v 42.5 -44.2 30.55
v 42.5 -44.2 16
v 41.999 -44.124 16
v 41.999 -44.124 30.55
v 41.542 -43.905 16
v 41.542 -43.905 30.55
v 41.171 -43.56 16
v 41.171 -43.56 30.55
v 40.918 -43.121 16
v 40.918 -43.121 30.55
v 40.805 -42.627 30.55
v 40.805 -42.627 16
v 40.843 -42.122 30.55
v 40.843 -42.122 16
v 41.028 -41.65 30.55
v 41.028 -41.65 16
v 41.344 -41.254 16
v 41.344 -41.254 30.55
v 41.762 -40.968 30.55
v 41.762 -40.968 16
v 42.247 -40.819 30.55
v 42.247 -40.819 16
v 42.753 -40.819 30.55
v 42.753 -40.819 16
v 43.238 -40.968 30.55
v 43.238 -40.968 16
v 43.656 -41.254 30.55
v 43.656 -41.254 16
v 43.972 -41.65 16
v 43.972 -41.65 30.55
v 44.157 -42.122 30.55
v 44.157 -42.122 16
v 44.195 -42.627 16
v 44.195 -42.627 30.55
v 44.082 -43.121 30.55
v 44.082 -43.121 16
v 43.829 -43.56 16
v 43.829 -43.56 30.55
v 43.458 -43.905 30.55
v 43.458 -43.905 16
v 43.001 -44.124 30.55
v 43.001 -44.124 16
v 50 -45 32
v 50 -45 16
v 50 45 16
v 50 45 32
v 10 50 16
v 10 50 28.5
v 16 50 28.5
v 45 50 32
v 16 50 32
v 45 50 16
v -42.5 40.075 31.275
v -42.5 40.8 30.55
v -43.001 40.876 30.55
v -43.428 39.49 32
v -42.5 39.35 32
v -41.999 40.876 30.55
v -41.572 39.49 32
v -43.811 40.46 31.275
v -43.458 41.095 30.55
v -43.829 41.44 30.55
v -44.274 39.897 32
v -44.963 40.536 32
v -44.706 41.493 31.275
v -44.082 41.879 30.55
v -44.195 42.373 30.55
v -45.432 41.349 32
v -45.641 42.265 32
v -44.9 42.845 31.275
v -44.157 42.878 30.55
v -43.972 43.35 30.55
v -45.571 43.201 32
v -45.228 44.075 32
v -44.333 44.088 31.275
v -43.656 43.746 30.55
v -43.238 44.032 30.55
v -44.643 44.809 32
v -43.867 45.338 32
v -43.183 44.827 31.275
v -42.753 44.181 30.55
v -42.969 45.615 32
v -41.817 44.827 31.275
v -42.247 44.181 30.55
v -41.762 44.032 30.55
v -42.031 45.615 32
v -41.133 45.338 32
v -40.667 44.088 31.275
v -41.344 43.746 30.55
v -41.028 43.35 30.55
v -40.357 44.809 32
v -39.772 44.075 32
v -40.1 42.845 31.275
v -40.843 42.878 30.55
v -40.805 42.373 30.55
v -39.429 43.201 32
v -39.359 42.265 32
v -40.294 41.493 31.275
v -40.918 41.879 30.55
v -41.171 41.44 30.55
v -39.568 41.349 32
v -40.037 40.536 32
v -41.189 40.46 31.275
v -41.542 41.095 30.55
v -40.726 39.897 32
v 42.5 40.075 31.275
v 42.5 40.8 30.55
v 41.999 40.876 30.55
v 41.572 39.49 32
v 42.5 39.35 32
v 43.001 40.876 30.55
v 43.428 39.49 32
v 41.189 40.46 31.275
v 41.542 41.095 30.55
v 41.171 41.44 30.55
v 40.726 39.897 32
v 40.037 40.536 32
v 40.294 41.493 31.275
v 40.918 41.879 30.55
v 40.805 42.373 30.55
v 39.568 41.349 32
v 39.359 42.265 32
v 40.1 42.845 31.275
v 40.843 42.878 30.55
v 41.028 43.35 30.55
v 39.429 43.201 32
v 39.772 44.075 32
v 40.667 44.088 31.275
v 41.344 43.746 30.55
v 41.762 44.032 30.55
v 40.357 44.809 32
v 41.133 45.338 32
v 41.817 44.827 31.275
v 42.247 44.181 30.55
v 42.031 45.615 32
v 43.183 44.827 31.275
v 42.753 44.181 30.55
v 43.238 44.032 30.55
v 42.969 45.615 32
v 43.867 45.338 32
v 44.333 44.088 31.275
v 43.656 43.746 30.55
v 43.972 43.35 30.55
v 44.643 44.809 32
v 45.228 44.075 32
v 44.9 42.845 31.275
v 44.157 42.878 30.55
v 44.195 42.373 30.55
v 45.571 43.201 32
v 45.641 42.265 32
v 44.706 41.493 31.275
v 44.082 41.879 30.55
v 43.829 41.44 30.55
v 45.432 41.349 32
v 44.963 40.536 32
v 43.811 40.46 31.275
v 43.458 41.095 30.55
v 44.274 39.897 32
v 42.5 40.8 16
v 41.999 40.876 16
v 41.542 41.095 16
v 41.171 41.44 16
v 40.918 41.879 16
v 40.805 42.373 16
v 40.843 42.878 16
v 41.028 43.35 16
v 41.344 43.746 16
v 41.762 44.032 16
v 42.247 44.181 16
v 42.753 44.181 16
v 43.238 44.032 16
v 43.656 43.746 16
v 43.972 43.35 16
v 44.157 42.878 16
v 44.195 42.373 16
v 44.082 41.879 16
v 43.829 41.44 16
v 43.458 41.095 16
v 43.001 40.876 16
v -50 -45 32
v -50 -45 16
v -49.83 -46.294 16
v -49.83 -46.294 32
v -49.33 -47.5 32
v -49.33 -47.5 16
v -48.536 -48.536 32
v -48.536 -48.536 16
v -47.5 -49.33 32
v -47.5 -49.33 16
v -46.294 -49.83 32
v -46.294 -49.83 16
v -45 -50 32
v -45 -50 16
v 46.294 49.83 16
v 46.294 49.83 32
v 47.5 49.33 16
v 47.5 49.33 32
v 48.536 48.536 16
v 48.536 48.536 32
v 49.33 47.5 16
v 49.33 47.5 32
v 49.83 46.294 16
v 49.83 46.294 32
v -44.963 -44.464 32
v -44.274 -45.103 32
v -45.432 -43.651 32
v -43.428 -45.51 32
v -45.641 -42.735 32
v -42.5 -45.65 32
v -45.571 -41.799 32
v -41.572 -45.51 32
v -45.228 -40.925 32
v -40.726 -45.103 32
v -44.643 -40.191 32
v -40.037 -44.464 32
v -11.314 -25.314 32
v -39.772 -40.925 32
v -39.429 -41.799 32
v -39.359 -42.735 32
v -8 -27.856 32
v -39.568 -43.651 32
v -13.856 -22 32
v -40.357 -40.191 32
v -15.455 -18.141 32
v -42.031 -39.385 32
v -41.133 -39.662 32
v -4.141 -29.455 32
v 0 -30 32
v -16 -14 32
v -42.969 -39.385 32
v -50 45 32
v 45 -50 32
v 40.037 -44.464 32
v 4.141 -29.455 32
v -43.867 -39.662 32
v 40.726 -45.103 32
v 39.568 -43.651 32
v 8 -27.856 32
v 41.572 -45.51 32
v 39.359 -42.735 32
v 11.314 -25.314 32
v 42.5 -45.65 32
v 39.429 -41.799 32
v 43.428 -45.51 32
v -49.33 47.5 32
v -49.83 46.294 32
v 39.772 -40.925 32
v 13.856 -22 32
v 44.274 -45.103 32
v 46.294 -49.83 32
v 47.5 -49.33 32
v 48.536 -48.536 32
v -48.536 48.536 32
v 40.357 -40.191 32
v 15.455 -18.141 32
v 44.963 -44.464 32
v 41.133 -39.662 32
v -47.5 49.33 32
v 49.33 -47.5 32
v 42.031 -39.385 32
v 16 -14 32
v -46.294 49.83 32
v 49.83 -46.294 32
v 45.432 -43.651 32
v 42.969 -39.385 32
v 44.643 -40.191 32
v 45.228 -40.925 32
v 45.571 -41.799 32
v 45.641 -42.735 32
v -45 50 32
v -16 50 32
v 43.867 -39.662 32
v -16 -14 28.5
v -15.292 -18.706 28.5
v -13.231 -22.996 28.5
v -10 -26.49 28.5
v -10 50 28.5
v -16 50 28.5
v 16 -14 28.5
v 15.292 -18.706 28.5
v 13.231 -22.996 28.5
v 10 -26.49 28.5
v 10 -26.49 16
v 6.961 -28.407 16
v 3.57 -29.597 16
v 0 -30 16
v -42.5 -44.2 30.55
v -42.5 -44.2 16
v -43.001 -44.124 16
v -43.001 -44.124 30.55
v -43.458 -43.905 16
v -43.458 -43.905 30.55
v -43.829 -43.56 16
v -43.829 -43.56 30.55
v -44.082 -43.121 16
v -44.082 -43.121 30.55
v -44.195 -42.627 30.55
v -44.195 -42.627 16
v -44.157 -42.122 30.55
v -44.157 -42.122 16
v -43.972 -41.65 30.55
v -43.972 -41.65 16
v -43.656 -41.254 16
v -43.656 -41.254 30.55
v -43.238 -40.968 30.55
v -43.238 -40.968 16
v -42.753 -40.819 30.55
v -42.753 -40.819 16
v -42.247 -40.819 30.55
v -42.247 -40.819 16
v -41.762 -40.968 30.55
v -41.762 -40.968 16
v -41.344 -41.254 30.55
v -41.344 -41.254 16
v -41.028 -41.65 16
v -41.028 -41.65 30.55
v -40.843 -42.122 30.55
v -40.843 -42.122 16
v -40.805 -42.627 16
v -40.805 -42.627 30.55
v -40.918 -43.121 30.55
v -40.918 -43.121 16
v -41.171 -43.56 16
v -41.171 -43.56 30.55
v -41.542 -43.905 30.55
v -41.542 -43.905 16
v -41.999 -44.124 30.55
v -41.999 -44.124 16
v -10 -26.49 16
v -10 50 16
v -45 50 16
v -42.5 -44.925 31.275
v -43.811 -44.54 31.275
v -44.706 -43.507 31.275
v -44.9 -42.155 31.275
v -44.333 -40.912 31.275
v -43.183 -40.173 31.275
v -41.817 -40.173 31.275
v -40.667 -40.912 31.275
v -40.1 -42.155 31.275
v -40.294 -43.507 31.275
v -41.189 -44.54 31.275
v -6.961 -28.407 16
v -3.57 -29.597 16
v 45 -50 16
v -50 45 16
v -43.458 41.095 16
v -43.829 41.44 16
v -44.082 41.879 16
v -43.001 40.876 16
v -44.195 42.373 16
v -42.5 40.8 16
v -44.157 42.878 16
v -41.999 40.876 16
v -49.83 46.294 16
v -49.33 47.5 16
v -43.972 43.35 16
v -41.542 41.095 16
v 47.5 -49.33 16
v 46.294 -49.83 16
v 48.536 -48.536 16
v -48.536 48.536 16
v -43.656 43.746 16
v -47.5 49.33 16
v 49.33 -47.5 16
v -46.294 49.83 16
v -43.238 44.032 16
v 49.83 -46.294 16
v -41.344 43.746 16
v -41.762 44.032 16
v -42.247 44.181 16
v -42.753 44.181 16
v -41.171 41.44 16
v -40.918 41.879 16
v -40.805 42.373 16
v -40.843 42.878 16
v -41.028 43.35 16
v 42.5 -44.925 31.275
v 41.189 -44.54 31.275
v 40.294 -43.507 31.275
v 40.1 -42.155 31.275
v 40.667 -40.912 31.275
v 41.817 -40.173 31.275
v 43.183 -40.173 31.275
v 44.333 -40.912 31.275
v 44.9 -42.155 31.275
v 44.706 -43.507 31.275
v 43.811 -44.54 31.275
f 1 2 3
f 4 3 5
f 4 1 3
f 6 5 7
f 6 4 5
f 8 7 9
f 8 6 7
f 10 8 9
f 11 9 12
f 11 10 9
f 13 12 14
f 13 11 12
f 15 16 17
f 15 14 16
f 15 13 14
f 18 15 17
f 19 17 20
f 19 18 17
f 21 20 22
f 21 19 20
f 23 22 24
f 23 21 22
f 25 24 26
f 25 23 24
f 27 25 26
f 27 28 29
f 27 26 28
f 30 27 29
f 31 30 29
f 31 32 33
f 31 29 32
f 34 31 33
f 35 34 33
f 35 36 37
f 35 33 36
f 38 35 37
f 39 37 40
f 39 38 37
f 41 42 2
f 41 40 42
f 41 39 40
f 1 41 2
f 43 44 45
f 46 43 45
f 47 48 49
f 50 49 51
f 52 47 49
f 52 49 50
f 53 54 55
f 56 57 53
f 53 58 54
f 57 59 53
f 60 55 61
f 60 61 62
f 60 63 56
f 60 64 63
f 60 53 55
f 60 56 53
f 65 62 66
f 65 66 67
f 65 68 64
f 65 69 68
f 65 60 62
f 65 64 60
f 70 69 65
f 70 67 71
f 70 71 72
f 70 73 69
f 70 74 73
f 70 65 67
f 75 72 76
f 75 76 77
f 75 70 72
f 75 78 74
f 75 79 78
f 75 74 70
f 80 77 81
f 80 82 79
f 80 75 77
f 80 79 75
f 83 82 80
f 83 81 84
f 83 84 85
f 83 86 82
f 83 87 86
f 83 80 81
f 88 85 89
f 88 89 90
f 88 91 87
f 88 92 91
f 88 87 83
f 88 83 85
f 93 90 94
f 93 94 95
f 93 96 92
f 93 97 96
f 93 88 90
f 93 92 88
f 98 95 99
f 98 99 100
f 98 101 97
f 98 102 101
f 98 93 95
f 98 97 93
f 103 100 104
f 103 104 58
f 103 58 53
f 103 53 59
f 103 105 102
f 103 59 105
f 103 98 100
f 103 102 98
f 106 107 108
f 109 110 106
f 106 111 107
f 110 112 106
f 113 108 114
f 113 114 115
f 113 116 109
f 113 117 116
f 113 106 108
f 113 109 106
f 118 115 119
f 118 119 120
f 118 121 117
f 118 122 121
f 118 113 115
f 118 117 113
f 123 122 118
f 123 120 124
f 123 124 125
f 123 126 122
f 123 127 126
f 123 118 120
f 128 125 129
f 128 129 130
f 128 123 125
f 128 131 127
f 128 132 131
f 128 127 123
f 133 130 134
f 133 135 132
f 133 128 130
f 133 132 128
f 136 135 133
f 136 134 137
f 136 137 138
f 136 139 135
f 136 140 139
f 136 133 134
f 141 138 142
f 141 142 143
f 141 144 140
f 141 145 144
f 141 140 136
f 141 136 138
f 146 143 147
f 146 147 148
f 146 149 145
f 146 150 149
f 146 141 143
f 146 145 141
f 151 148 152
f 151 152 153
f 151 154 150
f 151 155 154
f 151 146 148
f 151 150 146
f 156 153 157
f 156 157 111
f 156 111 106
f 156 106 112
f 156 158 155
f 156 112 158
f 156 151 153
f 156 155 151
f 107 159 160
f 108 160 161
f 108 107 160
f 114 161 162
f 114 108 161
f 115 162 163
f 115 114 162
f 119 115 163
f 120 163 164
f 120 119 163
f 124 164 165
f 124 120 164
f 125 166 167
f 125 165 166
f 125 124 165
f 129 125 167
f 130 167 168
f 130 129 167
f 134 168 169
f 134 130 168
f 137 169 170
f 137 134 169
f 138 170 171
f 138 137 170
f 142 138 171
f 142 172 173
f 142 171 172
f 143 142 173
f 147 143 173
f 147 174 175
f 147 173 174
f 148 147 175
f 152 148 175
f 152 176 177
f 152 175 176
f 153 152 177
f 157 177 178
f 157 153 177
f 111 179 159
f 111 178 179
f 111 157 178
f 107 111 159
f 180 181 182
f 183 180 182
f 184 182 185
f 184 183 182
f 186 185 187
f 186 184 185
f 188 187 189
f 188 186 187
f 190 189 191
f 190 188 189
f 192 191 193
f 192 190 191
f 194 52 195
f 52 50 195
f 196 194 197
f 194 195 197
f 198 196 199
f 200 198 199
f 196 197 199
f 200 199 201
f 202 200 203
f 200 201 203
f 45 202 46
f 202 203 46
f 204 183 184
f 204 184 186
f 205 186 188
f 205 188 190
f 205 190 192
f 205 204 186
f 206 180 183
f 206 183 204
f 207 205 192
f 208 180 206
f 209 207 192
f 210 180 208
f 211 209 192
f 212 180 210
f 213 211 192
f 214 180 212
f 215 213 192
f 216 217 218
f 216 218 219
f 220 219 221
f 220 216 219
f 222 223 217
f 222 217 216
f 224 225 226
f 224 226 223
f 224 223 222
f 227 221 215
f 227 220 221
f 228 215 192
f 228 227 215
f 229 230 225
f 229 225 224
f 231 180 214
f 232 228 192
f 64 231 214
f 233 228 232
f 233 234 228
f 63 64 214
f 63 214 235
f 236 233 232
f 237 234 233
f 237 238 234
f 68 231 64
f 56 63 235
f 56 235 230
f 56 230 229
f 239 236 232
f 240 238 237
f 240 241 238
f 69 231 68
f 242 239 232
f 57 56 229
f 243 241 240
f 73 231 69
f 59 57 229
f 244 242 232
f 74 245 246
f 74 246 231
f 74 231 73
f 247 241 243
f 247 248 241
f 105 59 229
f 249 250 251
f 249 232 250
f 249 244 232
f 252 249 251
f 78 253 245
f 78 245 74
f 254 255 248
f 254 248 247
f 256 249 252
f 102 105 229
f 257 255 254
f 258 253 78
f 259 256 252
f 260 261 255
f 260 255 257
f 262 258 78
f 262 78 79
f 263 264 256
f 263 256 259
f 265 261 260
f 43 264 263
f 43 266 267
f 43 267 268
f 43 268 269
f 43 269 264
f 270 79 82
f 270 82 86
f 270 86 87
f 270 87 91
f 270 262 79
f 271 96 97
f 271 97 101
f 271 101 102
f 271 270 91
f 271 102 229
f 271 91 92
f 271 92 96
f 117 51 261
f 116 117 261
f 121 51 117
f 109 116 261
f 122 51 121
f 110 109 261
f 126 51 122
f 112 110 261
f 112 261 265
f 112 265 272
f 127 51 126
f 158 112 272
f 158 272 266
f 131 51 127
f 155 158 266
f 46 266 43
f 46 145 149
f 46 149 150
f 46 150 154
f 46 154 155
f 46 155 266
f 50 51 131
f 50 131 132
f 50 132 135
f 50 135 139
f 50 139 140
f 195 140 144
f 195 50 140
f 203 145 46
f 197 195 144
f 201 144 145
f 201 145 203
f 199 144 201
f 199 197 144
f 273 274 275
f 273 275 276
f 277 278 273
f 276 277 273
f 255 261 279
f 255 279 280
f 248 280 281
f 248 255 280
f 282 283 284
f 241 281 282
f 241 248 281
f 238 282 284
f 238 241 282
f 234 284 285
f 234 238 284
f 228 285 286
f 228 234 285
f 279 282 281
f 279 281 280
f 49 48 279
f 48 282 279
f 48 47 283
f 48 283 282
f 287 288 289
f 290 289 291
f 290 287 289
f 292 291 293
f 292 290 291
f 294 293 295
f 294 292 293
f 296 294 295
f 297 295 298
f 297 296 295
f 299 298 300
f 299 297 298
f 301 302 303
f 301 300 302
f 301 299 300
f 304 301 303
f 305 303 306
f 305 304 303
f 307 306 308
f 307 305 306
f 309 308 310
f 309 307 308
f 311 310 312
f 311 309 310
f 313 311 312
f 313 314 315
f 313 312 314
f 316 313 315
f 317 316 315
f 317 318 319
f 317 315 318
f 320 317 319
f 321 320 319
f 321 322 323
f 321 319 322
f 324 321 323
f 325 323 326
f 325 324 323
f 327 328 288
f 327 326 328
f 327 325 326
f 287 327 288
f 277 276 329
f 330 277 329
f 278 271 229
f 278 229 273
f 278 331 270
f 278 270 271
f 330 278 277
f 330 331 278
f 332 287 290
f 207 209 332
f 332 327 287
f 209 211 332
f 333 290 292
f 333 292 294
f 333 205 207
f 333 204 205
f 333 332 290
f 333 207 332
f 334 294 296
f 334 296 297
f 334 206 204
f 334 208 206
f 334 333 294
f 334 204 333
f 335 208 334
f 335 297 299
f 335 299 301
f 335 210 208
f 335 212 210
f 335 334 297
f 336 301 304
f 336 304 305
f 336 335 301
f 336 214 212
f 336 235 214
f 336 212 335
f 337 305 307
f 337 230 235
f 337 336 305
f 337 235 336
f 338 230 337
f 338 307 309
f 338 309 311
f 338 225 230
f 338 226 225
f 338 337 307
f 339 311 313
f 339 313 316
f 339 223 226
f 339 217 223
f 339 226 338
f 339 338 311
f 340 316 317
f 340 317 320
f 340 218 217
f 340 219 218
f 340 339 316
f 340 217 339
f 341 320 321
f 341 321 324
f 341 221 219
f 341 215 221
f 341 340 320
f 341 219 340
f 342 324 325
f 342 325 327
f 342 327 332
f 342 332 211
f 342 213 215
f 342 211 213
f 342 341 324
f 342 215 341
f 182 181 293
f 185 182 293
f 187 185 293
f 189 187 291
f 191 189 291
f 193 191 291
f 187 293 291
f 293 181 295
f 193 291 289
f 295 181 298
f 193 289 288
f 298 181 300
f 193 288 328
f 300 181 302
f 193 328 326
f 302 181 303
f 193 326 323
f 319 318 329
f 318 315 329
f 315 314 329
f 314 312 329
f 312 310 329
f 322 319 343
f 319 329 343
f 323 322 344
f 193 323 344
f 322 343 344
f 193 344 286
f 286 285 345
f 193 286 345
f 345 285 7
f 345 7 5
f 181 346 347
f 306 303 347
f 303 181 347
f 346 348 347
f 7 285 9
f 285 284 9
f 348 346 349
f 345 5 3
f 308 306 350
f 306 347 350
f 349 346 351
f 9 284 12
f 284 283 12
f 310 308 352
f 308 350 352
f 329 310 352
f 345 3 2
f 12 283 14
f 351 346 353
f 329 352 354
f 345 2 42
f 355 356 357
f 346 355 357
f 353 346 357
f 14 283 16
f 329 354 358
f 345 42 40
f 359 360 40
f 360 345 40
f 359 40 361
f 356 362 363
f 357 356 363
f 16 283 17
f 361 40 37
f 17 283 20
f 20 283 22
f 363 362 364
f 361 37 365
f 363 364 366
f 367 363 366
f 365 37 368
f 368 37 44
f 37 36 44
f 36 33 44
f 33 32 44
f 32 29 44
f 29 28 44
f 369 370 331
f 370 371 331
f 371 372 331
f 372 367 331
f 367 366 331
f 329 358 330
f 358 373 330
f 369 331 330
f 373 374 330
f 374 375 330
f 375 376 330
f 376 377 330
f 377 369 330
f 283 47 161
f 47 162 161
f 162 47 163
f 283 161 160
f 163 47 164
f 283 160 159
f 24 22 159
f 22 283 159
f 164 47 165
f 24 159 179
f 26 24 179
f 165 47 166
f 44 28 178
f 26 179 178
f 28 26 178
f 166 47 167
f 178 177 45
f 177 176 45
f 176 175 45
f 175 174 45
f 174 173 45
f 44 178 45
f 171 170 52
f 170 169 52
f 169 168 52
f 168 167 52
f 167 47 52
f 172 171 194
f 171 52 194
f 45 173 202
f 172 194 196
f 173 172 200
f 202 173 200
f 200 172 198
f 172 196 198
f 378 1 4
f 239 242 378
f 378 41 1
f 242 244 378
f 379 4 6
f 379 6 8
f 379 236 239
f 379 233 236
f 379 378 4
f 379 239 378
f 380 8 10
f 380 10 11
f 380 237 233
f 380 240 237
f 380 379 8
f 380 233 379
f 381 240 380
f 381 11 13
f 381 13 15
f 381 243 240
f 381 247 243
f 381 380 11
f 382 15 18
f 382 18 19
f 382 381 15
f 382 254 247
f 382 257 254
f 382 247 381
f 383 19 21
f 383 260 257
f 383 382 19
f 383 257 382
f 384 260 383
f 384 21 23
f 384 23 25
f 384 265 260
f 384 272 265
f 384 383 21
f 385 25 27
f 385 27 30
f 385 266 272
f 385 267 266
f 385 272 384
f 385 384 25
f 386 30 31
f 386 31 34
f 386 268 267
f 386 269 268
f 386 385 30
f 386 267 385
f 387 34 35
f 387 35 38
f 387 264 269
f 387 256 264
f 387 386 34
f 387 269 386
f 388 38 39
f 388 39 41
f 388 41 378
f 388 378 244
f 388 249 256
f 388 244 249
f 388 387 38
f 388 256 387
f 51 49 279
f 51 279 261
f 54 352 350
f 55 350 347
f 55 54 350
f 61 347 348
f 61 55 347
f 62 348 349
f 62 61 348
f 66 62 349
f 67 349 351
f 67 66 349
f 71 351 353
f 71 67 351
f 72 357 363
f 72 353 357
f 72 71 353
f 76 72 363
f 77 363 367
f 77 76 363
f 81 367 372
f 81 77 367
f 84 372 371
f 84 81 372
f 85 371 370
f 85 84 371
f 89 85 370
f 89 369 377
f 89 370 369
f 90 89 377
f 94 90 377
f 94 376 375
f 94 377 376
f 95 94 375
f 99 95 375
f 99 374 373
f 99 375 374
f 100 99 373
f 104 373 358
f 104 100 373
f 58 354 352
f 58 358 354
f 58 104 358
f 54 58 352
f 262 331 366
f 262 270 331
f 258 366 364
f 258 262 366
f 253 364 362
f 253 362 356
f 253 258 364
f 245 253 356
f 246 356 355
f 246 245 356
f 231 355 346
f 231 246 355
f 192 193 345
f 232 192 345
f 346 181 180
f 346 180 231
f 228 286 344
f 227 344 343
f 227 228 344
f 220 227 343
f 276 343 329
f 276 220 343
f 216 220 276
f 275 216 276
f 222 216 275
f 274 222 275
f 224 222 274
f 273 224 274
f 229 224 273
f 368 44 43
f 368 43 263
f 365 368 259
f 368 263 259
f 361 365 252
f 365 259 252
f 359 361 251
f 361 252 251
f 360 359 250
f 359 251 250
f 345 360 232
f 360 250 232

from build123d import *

# Parameters (mm, degrees)
SKETCH1_W                                    = 100
SKETCH1_H                                    = 100
BOSS_EXTRUDE1_DEPTH                          = 16
SKETCH2_W                                    = 100
SKETCH2_H                                    = 100
BOSS_EXTRUDE2_DEPTH                          = 16
CUT_EXTRUDE1_DEPTH                           = 80
BOSS_EXTRUDE3_DEPTH                          = 16
BOSS_EXTRUDE4_REACH                          = 75.763
CSK_FOR_M3_COUNTERSUNK_FLAT_HEAD_SCR_2_COUNT = 2
CSK_FOR_M3_COUNTERSUNK_FLAT_HEAD_SCR_2_PITCH = 85
CSK_FOR_M3_COUNTERSUNK_FLAT_HEAD_SCR_3_COUNT = 2
CSK_FOR_M3_COUNTERSUNK_FLAT_HEAD_SCR_3_PITCH = 120.208152802
CSK_FOR_M3_COUNTERSUNK_FLAT_HEAD_SCR_4_COUNT = 2
CSK_FOR_M3_COUNTERSUNK_FLAT_HEAD_SCR_4_PITCH = 85
FILLET1_R                                    = 5
FILLET2_R                                    = 5


with BuildPart() as part:
    # Sketch1 → Boss-Extrude1 (new body)
    with BuildSketch(Plane.XY):
        Rectangle(SKETCH1_W, SKETCH1_H)
    extrude(amount=BOSS_EXTRUDE1_DEPTH)


with BuildPart() as body_2:
    # Sketch2 → Boss-Extrude2 (new body)
    with BuildSketch(Plane.XY.offset(16)):
        Rectangle(SKETCH2_W, SKETCH2_H)
    extrude(amount=BOSS_EXTRUDE2_DEPTH)


with BuildPart() as cut_extrude1_tool:
    # Sketch3 → Cut-Extrude1 (new body)
    with BuildSketch(Plane(origin=(0, 50, 0), x_dir=(1, 0, 0), z_dir=(0, 1, 0))):
        Polygon((-16, -32), (-16, -28.5), (-10, -28.5), (-10, -16), (-16, -16), (-16, -11), (16, -11), (16, -16), (10, -16), (10, -28.5), (16, -28.5), (16, -32), align=None)
    extrude(amount=-CUT_EXTRUDE1_DEPTH)


with BuildPart() as part_1:
    add(part.part)

    # Cut-Extrude1: cut by cut_extrude1_tool
    add(cut_extrude1_tool.part, mode=Mode.SUBTRACT)



with BuildPart() as body_2_1:
    add(body_2.part)

    # Cut-Extrude1: cut by cut_extrude1_tool
    add(cut_extrude1_tool.part, mode=Mode.SUBTRACT)

    # Sketch4 → Boss-Extrude3 (add)
    with BuildSketch(Plane.XY.offset(32)):
        with BuildLine():
            Line((-16, -14), (-16, -30))
            Line((-16, -30), (0, -30))
            ThreePointArc((0, -30), (-11.313708499, -25.313708499), (-16, -14))
        make_face()
        with BuildLine():
            ThreePointArc((16, -14), (11.313708499, -25.313708499), (0, -30))
            Line((0, -30), (16, -30))
            Line((16, -30), (16, -14))
        make_face()
    extrude(amount=-BOSS_EXTRUDE3_DEPTH)


with BuildPart() as part_2:
    add(part_1.part)

    # Sketch5 → Boss-Extrude4 (add, up to next)
    with BuildSketch(Plane.XY.offset(11), mode=Mode.PRIVATE) as boss_extrude4_sk1:
        with BuildLine():
            Line((16, -30), (16, -14))
            ThreePointArc((16, -14), (11.313708487, -25.313708511), (-3.4e-08, -30))
            Line((-3.4e-08, -30), (16, -30))
        make_face()
    boss_extrude4_tool1 = extrude(boss_extrude4_sk1.sketch, amount=BOSS_EXTRUDE4_REACH, mode=Mode.PRIVATE) - body_2_1.part
    # Sketch5 → Boss-Extrude4 (add, up to next)
    with BuildSketch(Plane.XY.offset(11), mode=Mode.PRIVATE) as boss_extrude4_sk2:
        with BuildLine():
            ThreePointArc((-3.4e-08, -30), (-11.313708511, -25.313708487), (-16, -14))
            Line((-16, -14), (-16, -30))
            Line((-16, -30), (-3.4e-08, -30))
        make_face()
    boss_extrude4_tool2 = extrude(boss_extrude4_sk2.sketch, amount=BOSS_EXTRUDE4_REACH, mode=Mode.PRIVATE) - body_2_1.part
    add(boss_extrude4_tool1.solids().sort_by_distance((12.426113, -26.426113, 11))[0])
    add(boss_extrude4_tool2.solids().sort_by_distance((-12.426113, -26.426113, 11))[0])


with BuildPart() as csk_for_m3_countersunk_flat_head_screw1_tool:
    # Sketch7 → CSK for M3 Countersunk Flat Head Screw1 (revolve)
    with BuildSketch(Plane(origin=(-42.5, 42.5, 32), x_dir=(0, -1, 0), z_dir=(1, 0, 0))):
        Polygon((0, 0), (0, 32), (1.7, 32), (1.7, 1.45), (3.15, 0), align=None)
    csk_for_m3_countersunk_flat_head_screw1 = revolve(axis=Axis((-42.5, 42.5, 38.35), (0, 0, -1)))


with BuildPart() as part_3:
    add(part_2.part)

    # CSK for M3 Countersunk Flat Head Screw1: cut by csk_for_m3_countersunk_flat_head_screw1_tool
    add(csk_for_m3_countersunk_flat_head_screw1_tool.part, mode=Mode.SUBTRACT)


with BuildPart() as body_2_2:
    add(body_2_1.part)

    # CSK for M3 Countersunk Flat Head Screw1: cut by csk_for_m3_countersunk_flat_head_screw1_tool
    add(csk_for_m3_countersunk_flat_head_screw1_tool.part, mode=Mode.SUBTRACT)


with BuildPart() as csk_for_m3_countersunk_flat_head_scr_2_tool:
    # CSK for M3 Countersunk Flat Head Scr 2: CSK for M3 Countersunk Flat Head Screw1 ×2
    with Locations(*[(i * CSK_FOR_M3_COUNTERSUNK_FLAT_HEAD_SCR_2_PITCH, 0, 0) for i in range(1, CSK_FOR_M3_COUNTERSUNK_FLAT_HEAD_SCR_2_COUNT)]):
        add(csk_for_m3_countersunk_flat_head_screw1)


with BuildPart() as part_4:
    add(part_3.part)

    # CSK for M3 Countersunk Flat Head Scr 2: cut by csk_for_m3_countersunk_flat_head_scr_2_tool
    add(csk_for_m3_countersunk_flat_head_scr_2_tool.part, mode=Mode.SUBTRACT)


with BuildPart() as body_2_3:
    add(body_2_2.part)

    # CSK for M3 Countersunk Flat Head Scr 2: cut by csk_for_m3_countersunk_flat_head_scr_2_tool
    add(csk_for_m3_countersunk_flat_head_scr_2_tool.part, mode=Mode.SUBTRACT)


with BuildPart() as csk_for_m3_countersunk_flat_head_scr_3_tool:
    # CSK for M3 Countersunk Flat Head Scr 3: CSK for M3 Countersunk Flat Head Screw1 ×2
    with Locations(*[Vector(0.7071067811865476, -0.7071067811865476, 0) * (i * CSK_FOR_M3_COUNTERSUNK_FLAT_HEAD_SCR_3_PITCH) for i in range(1, CSK_FOR_M3_COUNTERSUNK_FLAT_HEAD_SCR_3_COUNT)]):
        add(csk_for_m3_countersunk_flat_head_screw1)


with BuildPart() as part_5:
    add(part_4.part)

    # CSK for M3 Countersunk Flat Head Scr 3: cut by csk_for_m3_countersunk_flat_head_scr_3_tool
    add(csk_for_m3_countersunk_flat_head_scr_3_tool.part, mode=Mode.SUBTRACT)


with BuildPart() as body_2_4:
    add(body_2_3.part)

    # CSK for M3 Countersunk Flat Head Scr 3: cut by csk_for_m3_countersunk_flat_head_scr_3_tool
    add(csk_for_m3_countersunk_flat_head_scr_3_tool.part, mode=Mode.SUBTRACT)


with BuildPart() as csk_for_m3_countersunk_flat_head_scr_4_tool:
    # CSK for M3 Countersunk Flat Head Scr 4: CSK for M3 Countersunk Flat Head Screw1 ×2
    with Locations(*[(0, -i * CSK_FOR_M3_COUNTERSUNK_FLAT_HEAD_SCR_4_PITCH, 0) for i in range(1, CSK_FOR_M3_COUNTERSUNK_FLAT_HEAD_SCR_4_COUNT)]):
        add(csk_for_m3_countersunk_flat_head_screw1)


with BuildPart() as part_6:
    add(part_5.part)

    # CSK for M3 Countersunk Flat Head Scr 4: cut by csk_for_m3_countersunk_flat_head_scr_4_tool
    add(csk_for_m3_countersunk_flat_head_scr_4_tool.part, mode=Mode.SUBTRACT)

    # Fillet2
    fillet2_edges = [part_6.edges().sort_by_distance(p)[0] for p in [
        (-50, -50, 8),
        (-50, 50, 8),
        (50, 50, 8),
        (50, -50, 8),
    ]]
    fillet(fillet2_edges, radius=FILLET2_R)


with BuildPart() as body_2_5:
    add(body_2_4.part)

    # CSK for M3 Countersunk Flat Head Scr 4: cut by csk_for_m3_countersunk_flat_head_scr_4_tool
    add(csk_for_m3_countersunk_flat_head_scr_4_tool.part, mode=Mode.SUBTRACT)

    # Fillet1
    fillet1_edges = [body_2_5.edges().sort_by_distance(p)[0] for p in [
        (-50, 50, 24),
        (50, 50, 24),
        (50, -50, 24),
        (-50, -50, 24),
    ]]
    fillet(fillet1_edges, radius=FILLET1_R)


solid = body_2_5.part
